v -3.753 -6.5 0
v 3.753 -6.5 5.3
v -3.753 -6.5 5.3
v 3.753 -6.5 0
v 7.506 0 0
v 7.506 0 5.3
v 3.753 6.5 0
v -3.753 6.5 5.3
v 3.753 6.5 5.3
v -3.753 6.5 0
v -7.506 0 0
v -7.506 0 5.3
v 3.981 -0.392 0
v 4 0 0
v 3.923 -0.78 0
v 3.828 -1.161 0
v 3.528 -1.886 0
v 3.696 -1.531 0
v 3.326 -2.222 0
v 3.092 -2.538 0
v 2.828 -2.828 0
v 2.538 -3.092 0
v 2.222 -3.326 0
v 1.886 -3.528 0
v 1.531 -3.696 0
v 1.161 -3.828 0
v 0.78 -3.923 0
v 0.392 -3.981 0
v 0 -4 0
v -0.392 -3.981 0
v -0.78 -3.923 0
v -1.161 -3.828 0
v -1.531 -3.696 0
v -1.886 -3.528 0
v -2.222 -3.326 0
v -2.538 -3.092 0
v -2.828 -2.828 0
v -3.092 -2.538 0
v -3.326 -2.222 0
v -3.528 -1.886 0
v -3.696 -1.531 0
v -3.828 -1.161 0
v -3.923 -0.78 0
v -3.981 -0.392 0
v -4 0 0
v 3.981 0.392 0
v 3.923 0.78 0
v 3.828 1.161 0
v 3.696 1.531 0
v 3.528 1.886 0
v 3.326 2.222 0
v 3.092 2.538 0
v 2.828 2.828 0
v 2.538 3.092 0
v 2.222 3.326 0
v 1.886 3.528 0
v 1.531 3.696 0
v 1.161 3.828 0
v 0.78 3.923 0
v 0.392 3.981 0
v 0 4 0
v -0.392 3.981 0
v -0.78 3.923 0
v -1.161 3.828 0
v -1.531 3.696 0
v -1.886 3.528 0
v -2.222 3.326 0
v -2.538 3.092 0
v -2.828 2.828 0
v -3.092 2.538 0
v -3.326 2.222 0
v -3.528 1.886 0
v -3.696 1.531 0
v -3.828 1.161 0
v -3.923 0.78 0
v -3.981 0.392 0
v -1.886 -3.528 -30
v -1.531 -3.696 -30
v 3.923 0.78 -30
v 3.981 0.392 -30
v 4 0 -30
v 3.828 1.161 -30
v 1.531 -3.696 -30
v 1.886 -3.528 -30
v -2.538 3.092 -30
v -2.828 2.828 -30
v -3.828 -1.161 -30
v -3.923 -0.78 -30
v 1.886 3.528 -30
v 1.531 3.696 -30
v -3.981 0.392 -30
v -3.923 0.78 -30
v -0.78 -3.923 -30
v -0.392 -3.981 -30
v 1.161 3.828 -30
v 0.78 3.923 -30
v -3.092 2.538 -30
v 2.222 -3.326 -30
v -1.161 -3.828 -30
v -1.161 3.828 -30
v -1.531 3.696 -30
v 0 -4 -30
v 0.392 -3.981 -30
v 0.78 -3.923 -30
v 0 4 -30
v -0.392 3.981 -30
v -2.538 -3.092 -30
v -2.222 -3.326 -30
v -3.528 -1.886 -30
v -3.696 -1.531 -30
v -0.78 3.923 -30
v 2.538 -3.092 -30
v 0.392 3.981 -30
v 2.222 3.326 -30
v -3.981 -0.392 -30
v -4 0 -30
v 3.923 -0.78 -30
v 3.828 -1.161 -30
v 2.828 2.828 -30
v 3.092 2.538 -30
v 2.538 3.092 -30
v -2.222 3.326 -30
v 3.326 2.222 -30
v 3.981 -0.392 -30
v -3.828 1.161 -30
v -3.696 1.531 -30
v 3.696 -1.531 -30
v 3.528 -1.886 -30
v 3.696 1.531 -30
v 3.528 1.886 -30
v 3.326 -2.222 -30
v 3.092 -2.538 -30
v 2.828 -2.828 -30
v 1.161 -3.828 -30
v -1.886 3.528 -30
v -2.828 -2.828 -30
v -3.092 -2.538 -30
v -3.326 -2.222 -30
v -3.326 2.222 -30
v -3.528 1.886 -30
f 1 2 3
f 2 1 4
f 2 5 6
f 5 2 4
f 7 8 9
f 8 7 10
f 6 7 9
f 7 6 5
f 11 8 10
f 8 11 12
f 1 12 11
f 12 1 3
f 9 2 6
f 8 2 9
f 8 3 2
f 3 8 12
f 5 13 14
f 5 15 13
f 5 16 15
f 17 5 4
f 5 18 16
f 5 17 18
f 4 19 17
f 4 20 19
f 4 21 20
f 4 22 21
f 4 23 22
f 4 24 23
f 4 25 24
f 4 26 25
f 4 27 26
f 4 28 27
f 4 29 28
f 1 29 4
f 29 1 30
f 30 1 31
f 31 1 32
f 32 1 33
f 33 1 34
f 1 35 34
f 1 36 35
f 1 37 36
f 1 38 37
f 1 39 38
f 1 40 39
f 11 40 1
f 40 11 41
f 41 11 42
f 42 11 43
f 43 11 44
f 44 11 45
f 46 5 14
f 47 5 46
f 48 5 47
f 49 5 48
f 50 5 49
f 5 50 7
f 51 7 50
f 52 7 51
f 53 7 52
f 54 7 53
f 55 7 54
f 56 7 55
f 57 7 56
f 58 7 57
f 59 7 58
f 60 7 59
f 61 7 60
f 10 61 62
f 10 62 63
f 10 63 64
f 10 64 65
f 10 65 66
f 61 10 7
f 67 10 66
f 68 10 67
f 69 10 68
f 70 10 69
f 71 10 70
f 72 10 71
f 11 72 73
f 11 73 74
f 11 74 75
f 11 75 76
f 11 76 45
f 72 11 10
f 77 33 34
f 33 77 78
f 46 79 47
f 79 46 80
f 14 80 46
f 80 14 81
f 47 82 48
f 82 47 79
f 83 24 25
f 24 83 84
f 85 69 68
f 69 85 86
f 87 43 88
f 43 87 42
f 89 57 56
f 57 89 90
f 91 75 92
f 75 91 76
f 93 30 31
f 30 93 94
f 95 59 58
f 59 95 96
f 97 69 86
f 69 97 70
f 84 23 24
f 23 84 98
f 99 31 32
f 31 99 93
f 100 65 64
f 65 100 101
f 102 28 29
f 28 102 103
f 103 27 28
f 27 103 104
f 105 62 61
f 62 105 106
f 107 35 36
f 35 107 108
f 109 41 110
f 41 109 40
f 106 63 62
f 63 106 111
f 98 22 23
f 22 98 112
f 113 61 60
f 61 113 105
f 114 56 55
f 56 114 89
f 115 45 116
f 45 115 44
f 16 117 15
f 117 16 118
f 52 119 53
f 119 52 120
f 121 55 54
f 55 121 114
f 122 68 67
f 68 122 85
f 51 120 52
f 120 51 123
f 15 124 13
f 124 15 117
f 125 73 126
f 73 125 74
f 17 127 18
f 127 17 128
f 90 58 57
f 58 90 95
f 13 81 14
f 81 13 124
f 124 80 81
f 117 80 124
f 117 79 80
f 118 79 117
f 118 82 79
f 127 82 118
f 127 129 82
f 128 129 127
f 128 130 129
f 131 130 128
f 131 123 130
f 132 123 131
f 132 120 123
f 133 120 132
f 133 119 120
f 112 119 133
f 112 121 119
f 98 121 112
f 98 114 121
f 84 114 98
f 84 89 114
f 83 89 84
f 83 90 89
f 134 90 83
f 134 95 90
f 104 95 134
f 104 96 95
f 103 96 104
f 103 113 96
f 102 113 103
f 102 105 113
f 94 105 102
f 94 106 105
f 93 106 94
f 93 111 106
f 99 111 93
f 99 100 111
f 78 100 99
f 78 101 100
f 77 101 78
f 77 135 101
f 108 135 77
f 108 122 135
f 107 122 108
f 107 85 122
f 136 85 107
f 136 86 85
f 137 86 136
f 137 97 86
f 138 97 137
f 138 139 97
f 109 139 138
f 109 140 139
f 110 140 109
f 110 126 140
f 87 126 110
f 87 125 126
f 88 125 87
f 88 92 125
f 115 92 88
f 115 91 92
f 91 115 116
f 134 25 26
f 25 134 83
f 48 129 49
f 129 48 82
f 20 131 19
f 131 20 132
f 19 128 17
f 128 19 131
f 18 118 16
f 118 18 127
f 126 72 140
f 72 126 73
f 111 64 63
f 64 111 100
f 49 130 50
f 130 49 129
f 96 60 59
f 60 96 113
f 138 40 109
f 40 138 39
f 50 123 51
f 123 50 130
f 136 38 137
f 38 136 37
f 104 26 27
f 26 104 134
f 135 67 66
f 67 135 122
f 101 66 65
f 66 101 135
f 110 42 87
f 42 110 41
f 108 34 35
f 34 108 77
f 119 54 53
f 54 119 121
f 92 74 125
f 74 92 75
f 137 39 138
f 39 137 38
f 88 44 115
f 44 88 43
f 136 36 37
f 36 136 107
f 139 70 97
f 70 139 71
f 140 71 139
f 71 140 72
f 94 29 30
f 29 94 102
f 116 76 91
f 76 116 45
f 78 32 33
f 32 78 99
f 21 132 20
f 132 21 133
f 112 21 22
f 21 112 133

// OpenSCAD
// M8 hex bolt (thread omitted)

// parameters
across_flats = 13;          // head across-flats (mm)
head_height   = 5.3;        // head thickness (mm)
shank_diameter = 8;         // shank diameter (mm)
shank_length   = 30;        // shank length (mm)

// derived
head_radius = across_flats / sqrt(3);   // circumscribed radius of hex
shank_radius = shank_diameter / 2;

union() {
    // hexagonal head (z = 0 … +head_height)
    cylinder(h = head_height, r = head_radius, $fn = 6);

    // cylindrical shank (z = 0 … -shank_length)
    translate([0, 0, -shank_length])
        cylinder(h = shank_length, r = shank_radius, $fn = 64);
}
